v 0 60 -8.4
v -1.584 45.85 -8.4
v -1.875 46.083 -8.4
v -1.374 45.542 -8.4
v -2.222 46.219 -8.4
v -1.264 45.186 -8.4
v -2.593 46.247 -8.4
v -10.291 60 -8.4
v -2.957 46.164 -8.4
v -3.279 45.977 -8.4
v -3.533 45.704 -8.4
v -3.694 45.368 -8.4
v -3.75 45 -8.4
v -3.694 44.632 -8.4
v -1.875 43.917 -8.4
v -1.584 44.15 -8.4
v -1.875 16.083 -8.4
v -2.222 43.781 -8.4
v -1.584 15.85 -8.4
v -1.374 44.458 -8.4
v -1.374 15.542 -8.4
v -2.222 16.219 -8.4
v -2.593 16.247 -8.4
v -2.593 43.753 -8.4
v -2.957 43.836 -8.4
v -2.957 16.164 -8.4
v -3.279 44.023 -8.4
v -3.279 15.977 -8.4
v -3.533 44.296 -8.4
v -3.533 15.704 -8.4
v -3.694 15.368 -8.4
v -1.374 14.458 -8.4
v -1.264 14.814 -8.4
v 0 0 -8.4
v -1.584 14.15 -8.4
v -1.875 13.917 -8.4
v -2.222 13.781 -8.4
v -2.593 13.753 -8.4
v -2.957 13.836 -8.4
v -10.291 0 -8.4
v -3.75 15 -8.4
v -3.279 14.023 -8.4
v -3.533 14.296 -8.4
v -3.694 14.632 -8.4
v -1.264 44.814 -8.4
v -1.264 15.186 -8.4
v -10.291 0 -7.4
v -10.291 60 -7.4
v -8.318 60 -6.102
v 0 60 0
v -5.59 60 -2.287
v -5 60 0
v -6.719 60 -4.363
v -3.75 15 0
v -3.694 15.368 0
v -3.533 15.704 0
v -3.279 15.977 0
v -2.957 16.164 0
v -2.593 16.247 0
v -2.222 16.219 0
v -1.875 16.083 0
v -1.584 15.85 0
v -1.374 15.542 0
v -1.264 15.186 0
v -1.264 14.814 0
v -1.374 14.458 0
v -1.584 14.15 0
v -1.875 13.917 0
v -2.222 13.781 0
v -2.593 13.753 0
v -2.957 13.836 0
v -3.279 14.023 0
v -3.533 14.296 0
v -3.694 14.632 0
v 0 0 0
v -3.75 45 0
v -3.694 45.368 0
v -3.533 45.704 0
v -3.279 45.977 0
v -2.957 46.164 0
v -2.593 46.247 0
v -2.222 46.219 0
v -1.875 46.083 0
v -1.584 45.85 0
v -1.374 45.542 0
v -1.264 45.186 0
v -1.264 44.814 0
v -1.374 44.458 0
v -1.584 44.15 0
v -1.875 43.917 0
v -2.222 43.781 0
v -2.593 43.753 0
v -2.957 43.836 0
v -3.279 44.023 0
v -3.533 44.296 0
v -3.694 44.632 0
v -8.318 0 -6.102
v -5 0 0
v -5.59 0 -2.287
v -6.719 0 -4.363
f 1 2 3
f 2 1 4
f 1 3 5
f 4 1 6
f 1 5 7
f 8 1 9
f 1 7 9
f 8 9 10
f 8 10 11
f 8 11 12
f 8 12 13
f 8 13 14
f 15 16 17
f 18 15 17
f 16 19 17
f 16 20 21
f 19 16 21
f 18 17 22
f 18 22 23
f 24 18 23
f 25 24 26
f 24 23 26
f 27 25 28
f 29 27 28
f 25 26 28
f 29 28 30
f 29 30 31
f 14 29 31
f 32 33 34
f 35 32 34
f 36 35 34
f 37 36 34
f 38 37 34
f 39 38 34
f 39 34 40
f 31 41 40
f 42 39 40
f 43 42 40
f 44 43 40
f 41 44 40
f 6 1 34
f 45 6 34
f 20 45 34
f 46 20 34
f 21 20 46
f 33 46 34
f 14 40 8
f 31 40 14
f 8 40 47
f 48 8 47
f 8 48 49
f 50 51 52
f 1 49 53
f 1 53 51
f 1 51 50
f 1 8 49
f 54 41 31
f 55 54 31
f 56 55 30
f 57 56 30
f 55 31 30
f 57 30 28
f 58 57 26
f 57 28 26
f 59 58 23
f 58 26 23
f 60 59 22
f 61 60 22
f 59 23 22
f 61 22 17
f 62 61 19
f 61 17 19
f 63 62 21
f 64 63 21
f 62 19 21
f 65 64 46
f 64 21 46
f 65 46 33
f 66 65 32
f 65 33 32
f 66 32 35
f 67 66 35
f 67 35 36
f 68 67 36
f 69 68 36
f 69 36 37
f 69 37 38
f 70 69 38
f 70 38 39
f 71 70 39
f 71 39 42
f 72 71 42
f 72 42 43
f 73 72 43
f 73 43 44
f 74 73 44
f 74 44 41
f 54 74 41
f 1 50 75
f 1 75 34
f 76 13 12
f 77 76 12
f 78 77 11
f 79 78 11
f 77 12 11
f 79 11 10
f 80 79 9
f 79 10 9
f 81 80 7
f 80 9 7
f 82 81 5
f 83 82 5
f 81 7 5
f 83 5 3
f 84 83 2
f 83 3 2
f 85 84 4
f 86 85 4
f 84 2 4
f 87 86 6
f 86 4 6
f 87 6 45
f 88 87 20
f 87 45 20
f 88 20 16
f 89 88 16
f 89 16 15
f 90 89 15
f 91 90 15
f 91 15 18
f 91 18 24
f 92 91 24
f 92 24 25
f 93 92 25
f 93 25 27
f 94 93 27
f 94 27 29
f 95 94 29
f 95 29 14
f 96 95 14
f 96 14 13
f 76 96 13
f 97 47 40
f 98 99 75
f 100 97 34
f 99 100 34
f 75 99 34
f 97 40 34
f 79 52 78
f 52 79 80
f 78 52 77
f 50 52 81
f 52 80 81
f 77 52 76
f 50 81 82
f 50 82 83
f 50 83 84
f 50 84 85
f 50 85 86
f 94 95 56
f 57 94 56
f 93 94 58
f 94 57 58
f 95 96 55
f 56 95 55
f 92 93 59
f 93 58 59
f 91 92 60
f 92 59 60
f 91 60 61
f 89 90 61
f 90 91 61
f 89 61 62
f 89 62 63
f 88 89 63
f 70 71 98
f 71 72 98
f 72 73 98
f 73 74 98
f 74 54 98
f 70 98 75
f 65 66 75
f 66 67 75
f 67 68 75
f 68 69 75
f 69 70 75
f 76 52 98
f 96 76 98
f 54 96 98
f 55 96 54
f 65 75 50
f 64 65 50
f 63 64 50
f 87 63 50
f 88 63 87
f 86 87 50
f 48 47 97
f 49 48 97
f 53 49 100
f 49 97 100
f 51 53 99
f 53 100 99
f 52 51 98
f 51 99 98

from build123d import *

# Parameters (mm, degrees)
BOSS_EXTRUDE1_DEPTH   = 60
F_2_5MM_DOWEL_HOLE1_D = 2.5


with BuildPart() as part:
    # Sketch1 → Boss-Extrude1 (new body)
    with BuildSketch(Plane(origin=(0, 0, 0), x_dir=(1, 0, 0), z_dir=(0, 1, 0))):
        with BuildLine():
            Line((0, 0), (0, 8.4))
            Line((0, 8.4), (-10.290849044, 8.4))
            Line((-10.290849044, 8.4), (-10.290849044, 7.4))
            ThreePointArc((-10.290849044, 7.4), (-6.718748073, 4.362554757), (-5, 0))
            Line((-5, 0), (0, 0))
        make_face()
    extrude(amount=BOSS_EXTRUDE1_DEPTH)

    # Ø2.5mm Dowel Hole1 (through all)
    with Locations(Plane(origin=(-2.5, 45, 0), x_dir=(1, 0, 0), z_dir=(0, 0, 1))):
        with Locations((0, 0), (0, -30)):
            Hole(F_2_5MM_DOWEL_HOLE1_D / 2)


solid = part.part
